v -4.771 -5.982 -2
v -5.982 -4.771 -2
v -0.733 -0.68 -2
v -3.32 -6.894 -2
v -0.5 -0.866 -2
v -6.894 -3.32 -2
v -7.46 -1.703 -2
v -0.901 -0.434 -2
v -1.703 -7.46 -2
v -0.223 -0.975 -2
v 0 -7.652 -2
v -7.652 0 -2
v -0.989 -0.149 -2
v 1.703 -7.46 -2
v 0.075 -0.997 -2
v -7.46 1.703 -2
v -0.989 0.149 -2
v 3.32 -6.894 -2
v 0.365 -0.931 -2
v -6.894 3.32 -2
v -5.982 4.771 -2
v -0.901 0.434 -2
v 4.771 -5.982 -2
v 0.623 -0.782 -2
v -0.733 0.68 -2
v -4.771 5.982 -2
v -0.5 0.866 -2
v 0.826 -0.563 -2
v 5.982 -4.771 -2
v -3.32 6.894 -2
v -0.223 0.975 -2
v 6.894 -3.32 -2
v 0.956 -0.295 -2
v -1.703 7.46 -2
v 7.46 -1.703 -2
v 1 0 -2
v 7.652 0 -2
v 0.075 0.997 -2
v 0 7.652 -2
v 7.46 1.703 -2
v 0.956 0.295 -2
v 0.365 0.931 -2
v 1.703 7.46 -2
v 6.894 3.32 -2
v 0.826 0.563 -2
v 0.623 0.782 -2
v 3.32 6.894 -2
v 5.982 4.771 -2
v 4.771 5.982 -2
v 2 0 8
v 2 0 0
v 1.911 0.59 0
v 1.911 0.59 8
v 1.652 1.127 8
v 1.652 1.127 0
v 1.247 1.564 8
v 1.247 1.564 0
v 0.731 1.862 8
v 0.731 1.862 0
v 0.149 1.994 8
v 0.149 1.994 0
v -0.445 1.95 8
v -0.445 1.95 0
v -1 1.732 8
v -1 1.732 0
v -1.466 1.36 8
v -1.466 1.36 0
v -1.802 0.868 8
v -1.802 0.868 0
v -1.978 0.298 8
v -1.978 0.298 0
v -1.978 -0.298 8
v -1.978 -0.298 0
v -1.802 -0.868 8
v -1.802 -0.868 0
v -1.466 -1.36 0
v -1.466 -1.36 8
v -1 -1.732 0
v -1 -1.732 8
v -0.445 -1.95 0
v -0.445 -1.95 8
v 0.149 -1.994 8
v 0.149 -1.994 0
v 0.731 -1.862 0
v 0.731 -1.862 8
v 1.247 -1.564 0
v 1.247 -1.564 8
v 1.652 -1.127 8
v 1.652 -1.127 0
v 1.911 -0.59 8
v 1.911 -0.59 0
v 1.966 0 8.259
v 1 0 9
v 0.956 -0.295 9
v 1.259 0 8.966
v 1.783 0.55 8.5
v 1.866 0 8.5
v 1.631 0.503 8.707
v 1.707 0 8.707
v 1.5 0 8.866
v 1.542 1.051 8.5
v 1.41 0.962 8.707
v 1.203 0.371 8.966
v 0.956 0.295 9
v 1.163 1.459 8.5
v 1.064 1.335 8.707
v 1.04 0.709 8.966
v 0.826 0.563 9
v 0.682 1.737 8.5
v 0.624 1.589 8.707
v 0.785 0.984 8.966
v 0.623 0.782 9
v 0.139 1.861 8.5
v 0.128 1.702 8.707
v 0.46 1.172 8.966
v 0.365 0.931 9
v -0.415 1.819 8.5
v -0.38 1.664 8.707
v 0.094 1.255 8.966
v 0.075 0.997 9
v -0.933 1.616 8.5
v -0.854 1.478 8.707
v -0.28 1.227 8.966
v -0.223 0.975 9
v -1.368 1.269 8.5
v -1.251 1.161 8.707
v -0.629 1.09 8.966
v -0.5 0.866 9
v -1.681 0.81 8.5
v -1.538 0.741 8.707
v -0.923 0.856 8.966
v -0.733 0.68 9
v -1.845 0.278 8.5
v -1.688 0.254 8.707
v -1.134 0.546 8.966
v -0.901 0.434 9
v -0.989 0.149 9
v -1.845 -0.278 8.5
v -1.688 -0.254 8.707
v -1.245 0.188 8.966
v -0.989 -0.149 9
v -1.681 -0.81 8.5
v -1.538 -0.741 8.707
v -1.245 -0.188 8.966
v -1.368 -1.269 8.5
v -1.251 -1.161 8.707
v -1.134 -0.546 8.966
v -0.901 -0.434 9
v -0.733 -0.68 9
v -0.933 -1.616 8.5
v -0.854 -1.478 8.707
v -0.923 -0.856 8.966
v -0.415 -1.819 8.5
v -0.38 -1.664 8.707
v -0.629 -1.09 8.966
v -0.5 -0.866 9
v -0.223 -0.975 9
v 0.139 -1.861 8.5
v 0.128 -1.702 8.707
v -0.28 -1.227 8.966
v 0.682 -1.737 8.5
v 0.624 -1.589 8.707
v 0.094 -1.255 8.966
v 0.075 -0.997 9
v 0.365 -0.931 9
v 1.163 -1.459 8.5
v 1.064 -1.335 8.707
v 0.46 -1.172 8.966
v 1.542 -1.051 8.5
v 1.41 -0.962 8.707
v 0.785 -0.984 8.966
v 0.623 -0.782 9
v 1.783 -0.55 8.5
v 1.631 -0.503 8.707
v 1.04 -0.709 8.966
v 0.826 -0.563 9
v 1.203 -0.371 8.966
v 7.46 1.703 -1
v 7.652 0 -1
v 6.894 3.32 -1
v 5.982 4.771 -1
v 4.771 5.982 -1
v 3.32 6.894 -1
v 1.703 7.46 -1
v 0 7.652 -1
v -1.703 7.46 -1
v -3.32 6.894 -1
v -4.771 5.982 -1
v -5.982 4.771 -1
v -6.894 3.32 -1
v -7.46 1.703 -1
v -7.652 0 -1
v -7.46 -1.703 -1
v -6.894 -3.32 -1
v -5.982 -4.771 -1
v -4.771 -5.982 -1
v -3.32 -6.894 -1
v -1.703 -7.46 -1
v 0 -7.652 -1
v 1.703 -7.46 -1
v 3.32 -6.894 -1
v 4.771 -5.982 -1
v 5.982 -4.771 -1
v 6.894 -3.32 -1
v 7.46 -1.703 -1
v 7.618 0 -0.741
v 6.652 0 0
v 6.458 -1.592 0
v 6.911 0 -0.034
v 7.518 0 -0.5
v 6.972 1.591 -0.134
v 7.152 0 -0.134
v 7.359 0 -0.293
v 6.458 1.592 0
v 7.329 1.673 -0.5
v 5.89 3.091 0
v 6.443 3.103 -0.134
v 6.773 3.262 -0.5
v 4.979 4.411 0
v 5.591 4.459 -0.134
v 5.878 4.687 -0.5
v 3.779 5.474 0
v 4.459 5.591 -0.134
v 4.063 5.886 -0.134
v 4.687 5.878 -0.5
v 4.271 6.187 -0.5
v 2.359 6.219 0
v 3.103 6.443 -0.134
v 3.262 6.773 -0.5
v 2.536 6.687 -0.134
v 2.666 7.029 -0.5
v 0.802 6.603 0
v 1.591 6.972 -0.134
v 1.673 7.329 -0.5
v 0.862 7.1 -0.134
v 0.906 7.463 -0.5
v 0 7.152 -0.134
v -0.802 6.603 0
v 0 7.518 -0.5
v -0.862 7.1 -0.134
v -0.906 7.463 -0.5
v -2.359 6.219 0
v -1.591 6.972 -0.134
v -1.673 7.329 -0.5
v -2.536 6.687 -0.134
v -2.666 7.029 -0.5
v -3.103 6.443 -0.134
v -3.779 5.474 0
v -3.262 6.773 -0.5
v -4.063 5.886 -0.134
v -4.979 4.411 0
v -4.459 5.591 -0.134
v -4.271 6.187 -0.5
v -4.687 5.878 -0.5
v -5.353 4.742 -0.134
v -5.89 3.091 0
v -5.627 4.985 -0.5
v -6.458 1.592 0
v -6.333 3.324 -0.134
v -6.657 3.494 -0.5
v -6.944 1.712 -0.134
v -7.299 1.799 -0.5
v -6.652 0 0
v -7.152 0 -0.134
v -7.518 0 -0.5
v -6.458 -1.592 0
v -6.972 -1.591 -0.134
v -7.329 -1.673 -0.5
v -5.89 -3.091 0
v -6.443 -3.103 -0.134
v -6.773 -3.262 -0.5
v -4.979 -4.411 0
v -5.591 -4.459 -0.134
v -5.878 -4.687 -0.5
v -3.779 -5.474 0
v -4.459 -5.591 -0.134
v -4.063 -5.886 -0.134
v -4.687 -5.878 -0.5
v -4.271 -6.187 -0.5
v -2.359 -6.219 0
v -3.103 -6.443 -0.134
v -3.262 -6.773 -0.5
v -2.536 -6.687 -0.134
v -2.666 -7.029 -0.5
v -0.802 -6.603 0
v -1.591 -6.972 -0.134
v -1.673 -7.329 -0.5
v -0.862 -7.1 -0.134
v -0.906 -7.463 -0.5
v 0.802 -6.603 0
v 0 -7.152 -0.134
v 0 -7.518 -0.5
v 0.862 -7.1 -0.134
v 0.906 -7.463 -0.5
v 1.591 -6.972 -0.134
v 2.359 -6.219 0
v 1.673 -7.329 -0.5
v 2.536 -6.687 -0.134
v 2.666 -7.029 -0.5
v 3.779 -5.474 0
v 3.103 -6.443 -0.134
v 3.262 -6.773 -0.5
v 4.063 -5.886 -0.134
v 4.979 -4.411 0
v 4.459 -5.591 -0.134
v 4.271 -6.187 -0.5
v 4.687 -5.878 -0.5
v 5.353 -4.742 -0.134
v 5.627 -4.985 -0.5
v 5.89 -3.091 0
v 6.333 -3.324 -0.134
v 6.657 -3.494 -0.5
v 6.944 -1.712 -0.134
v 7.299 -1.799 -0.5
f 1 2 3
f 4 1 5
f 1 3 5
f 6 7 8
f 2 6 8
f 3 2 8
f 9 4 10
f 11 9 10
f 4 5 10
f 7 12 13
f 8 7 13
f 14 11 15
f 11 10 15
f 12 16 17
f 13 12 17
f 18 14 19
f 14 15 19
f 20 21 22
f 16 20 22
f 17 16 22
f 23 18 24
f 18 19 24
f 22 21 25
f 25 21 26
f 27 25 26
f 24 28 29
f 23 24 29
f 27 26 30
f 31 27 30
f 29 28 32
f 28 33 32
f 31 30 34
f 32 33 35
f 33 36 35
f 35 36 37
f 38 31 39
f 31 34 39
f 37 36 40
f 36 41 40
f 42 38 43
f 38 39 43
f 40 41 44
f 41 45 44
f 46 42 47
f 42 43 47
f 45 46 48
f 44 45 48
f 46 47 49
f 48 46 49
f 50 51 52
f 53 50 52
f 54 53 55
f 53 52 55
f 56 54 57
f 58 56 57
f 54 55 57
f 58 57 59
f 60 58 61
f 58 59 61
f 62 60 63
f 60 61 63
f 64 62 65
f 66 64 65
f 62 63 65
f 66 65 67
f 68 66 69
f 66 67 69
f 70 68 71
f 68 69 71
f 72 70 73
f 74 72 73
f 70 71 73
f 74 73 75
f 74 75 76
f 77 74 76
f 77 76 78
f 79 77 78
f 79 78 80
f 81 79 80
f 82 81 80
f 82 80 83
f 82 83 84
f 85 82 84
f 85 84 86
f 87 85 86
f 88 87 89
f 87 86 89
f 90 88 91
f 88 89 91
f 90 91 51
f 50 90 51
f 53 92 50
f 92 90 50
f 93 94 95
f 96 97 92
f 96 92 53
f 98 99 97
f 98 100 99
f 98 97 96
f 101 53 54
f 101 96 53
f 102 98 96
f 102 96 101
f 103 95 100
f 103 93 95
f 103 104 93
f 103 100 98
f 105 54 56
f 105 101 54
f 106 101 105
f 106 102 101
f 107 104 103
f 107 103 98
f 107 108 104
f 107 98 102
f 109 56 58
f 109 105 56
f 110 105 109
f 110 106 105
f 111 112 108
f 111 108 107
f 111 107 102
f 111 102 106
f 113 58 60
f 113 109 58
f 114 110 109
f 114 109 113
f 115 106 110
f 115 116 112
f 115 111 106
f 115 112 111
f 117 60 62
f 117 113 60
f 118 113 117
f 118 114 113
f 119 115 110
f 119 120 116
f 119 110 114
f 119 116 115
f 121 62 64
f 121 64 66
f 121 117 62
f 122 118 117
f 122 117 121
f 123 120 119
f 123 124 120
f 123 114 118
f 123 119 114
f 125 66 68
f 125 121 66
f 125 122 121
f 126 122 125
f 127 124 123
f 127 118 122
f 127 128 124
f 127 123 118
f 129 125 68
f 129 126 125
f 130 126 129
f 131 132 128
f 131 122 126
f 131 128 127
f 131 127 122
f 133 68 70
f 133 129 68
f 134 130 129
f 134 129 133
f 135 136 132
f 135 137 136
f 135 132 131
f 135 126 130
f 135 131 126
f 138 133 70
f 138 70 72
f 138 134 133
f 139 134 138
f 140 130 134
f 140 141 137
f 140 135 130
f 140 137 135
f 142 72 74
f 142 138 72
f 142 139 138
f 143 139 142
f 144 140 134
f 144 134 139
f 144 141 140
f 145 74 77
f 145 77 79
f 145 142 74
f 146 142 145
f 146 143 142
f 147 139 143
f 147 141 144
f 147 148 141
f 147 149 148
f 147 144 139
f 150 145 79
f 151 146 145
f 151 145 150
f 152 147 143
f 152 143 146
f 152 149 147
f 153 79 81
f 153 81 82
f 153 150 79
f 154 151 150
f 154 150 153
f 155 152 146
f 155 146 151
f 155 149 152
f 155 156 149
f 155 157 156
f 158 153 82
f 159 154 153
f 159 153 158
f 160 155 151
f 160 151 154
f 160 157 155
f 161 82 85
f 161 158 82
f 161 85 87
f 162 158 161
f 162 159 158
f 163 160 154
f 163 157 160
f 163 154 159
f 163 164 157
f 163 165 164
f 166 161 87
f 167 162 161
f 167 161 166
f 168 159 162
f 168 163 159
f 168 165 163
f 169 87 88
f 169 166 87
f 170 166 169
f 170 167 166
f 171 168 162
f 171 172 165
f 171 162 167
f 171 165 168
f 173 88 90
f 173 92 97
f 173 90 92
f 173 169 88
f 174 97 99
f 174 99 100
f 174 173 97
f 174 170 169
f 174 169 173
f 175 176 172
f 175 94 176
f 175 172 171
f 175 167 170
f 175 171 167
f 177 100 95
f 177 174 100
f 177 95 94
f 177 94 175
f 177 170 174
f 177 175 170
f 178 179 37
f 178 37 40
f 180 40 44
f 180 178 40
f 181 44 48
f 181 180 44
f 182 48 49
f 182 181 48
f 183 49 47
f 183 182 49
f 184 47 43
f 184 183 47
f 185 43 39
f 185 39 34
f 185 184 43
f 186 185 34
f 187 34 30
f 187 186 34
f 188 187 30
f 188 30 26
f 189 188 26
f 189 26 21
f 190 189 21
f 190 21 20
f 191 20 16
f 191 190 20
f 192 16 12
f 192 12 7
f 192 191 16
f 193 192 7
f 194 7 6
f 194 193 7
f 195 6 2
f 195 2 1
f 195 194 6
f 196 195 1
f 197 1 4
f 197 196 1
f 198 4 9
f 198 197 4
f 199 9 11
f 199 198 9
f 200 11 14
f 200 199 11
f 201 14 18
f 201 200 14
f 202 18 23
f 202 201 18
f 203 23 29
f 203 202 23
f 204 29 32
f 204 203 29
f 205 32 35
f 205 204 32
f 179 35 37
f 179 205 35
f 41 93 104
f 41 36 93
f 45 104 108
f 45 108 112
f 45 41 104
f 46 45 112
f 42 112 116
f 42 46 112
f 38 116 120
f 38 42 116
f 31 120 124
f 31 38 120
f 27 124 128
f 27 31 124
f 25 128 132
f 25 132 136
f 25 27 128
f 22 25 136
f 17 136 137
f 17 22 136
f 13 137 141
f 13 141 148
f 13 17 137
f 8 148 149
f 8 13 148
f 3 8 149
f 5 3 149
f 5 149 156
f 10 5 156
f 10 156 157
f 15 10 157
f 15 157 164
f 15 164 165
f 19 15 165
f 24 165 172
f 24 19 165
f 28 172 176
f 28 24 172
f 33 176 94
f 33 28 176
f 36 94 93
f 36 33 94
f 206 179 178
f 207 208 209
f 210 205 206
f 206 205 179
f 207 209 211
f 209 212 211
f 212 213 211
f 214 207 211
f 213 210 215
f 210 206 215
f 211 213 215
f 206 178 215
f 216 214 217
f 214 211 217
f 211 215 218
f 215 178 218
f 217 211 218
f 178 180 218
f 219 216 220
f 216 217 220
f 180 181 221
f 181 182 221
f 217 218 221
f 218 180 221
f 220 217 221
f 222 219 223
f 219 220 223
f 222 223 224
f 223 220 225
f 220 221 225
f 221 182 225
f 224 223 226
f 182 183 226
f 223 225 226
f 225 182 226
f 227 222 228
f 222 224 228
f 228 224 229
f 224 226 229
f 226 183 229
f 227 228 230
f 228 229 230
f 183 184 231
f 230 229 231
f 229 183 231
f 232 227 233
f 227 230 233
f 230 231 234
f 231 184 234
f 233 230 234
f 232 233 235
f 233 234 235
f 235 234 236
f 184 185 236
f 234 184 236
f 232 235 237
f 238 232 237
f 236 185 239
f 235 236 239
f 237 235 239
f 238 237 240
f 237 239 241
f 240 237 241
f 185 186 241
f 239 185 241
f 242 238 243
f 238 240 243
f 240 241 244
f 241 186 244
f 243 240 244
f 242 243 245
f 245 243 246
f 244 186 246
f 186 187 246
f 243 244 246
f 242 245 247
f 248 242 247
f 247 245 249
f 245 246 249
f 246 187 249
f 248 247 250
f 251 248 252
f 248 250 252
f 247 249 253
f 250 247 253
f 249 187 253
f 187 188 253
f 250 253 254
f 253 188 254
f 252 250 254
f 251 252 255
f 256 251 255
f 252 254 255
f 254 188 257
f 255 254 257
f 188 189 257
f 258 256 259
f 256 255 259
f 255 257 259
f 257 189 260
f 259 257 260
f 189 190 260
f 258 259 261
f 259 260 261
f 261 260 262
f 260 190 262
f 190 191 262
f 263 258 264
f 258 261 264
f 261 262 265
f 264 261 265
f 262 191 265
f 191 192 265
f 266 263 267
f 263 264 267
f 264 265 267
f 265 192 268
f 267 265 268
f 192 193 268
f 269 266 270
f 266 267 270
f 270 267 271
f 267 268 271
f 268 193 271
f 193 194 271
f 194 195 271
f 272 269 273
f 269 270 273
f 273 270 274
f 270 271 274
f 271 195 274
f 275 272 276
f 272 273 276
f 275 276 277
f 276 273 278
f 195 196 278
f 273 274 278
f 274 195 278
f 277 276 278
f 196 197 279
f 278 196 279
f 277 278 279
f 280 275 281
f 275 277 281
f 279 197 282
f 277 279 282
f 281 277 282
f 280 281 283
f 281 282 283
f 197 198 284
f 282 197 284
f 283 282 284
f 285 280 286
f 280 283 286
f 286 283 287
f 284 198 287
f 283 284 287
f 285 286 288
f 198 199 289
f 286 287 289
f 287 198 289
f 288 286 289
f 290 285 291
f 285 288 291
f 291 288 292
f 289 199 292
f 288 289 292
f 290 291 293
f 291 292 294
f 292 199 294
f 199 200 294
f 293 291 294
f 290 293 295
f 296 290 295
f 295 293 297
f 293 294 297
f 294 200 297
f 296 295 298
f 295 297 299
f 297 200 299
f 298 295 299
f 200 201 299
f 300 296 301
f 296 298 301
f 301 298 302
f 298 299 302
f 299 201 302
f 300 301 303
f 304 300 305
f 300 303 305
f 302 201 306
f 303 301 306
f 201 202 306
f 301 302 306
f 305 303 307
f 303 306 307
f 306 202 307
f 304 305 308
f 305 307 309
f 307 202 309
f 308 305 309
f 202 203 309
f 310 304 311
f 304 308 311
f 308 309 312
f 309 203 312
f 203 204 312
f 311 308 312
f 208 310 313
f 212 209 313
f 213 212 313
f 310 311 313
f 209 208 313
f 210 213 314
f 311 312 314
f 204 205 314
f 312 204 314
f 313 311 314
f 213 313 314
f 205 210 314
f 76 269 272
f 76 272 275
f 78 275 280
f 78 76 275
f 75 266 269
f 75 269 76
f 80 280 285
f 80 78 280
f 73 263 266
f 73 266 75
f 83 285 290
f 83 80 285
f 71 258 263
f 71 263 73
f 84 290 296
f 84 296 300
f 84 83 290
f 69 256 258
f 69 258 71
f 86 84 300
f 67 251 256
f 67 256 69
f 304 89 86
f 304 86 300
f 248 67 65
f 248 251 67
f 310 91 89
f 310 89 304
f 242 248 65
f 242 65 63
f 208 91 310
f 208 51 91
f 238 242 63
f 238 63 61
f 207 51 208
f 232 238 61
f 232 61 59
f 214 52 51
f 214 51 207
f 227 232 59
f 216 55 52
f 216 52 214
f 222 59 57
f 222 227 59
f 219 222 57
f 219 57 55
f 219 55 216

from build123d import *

# Parameters (mm, degrees)
F0_R     = 7.6516982388
F0_R_2   = 1
F2_DEPTH = 2
F1_R     = 2
F1_R_2   = 1
F3_DEPTH = 9
F4_R     = 0.99999
F5_R     = 1


# Not quite as in the source:
# - a fillet or chamfer is up to 0.001 mm smaller than in the source, because OpenCascade refuses the exact size


with BuildPart() as f2:
    # F0 (on Top) → F2 (new body)
    with BuildSketch(Plane.XY):
        Circle(F0_R)
        Circle(F0_R_2, mode=Mode.SUBTRACT)
    extrude(amount=-F2_DEPTH)

    # F1 (on face) → F3 (join)
    with BuildSketch(Plane.XY):
        Circle(F1_R)
        Circle(F1_R_2, mode=Mode.SUBTRACT)
    extrude(amount=F3_DEPTH)

    # F4 (radius 1 in the source; OpenCascade refuses exactly that, so slightly less here)
    f4_edges = [f2.edges().sort_by_distance(p)[0] for p in [
        (-2, 0, 9),
    ]]
    fillet(f4_edges, radius=F4_R)

    # F5
    f5_edges = [f2.edges().sort_by_distance(p)[0] for p in [
        (-7.651698, 0, 0),
    ]]
    fillet(f5_edges, radius=F5_R)


solid = f2.part
